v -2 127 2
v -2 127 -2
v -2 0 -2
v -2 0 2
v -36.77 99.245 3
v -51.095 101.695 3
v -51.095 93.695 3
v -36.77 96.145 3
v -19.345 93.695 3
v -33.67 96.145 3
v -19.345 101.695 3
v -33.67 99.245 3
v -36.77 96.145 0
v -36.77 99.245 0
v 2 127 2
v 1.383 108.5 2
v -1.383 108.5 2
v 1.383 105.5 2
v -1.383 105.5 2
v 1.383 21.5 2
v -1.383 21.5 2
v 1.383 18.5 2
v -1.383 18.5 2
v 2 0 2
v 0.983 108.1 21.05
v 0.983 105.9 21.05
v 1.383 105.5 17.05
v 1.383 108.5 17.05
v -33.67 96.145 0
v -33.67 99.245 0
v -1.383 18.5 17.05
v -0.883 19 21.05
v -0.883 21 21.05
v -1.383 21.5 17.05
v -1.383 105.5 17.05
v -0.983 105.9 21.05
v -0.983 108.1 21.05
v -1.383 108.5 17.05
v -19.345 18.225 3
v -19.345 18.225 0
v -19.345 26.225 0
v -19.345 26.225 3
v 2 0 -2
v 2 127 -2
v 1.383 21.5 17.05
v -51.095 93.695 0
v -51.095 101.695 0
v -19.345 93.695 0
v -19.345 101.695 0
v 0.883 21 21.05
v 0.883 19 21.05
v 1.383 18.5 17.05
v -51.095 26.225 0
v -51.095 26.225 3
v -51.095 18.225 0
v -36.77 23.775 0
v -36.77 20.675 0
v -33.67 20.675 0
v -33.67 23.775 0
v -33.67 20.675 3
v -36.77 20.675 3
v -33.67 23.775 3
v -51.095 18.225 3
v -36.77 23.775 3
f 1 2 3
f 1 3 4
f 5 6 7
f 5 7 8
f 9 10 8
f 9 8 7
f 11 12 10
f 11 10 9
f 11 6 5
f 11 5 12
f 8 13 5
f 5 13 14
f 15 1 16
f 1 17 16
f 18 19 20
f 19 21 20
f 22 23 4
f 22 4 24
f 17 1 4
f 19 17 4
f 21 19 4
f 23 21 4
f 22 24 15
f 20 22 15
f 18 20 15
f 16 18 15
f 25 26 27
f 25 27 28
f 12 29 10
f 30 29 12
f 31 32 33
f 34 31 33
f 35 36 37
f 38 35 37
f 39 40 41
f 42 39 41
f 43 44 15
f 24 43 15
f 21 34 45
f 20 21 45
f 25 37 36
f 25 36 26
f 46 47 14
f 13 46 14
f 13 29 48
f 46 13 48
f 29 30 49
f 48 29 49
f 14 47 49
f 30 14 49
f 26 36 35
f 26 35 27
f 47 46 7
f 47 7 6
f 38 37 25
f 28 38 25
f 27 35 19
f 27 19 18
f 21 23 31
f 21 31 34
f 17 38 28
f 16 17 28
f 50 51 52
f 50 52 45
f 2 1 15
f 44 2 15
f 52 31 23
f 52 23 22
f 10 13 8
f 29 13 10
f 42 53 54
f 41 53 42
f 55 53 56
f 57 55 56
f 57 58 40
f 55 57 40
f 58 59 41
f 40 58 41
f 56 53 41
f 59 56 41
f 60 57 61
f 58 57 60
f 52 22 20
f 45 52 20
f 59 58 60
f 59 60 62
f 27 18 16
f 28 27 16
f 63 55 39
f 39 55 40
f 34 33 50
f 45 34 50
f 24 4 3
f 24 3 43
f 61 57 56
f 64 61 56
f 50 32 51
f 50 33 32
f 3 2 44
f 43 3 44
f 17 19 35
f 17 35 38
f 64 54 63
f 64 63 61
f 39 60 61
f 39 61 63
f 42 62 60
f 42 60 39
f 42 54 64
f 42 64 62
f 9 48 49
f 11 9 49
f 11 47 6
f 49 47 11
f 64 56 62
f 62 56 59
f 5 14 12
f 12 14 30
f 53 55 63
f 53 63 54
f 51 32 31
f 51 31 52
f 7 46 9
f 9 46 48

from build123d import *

# Parameters (mm, degrees)
F0_W     = 4
F0_H     = 4
F1_DEPTH = 127
F2_W     = 2.766012
F2_H     = 3
F3_DEPTH = 19.05
F4_SIZE2 = 0.4
F4_SIZE  = 4
F5_SIZE2 = 0.5
F5_SIZE  = 4
F6_W     = 31.75
F6_H     = 8
F6_W_2   = 3.1
F6_H_2   = 3.1
F7_DEPTH = 3


with BuildPart() as f1:
    # F0 (on Front) → F1 (new body)
    with BuildSketch(Plane.XZ):
        Rectangle(F0_W, F0_H)
    extrude(amount=-F1_DEPTH)

    # F2 (on face) → F3 (join)
    with BuildSketch(Plane.XY.offset(2)):
        with Locations((0, 107)):
            Rectangle(F2_W, F2_H)
        with Locations((0, 20)):
            Rectangle(F2_W, F2_H)
    extrude(amount=F3_DEPTH)

    # F4
    f4_edges = [f1.edges().sort_by_distance(p)[0] for p in [
        (1.383006, 107, 21.05),
        (0, 108.5, 21.05),
        (-1.383006, 107, 21.05),
        (0, 105.5, 21.05),
    ]]
    chamfer(f4_edges, length=F4_SIZE, length2=F4_SIZE2)

    # F5
    f5_edges = [f1.edges().sort_by_distance(p)[0] for p in [
        (0, 18.5, 21.05),
        (1.383006, 20, 21.05),
        (-1.383006, 20, 21.05),
        (0, 21.5, 21.05),
    ]]
    chamfer(f5_edges, length=F5_SIZE, length2=F5_SIZE2)


with BuildPart() as f7:
    # F6 (on Top) → F7 (new body)
    with BuildSketch(Plane.XY):
        with Locations((-35.2201, 97.695071)):
            Rectangle(F6_W, F6_H)
        with Locations((-35.2201, 97.695071)):
            Rectangle(F6_W_2, F6_H_2, mode=Mode.SUBTRACT)
        with Locations((-35.2201, 22.224929)):
            Rectangle(F6_W, F6_H)
        with Locations((-35.2201, 22.224929)):
            Rectangle(F6_W_2, F6_H_2, mode=Mode.SUBTRACT)
    extrude(amount=F7_DEPTH)


solid = Compound([f1.part, f7.part])
